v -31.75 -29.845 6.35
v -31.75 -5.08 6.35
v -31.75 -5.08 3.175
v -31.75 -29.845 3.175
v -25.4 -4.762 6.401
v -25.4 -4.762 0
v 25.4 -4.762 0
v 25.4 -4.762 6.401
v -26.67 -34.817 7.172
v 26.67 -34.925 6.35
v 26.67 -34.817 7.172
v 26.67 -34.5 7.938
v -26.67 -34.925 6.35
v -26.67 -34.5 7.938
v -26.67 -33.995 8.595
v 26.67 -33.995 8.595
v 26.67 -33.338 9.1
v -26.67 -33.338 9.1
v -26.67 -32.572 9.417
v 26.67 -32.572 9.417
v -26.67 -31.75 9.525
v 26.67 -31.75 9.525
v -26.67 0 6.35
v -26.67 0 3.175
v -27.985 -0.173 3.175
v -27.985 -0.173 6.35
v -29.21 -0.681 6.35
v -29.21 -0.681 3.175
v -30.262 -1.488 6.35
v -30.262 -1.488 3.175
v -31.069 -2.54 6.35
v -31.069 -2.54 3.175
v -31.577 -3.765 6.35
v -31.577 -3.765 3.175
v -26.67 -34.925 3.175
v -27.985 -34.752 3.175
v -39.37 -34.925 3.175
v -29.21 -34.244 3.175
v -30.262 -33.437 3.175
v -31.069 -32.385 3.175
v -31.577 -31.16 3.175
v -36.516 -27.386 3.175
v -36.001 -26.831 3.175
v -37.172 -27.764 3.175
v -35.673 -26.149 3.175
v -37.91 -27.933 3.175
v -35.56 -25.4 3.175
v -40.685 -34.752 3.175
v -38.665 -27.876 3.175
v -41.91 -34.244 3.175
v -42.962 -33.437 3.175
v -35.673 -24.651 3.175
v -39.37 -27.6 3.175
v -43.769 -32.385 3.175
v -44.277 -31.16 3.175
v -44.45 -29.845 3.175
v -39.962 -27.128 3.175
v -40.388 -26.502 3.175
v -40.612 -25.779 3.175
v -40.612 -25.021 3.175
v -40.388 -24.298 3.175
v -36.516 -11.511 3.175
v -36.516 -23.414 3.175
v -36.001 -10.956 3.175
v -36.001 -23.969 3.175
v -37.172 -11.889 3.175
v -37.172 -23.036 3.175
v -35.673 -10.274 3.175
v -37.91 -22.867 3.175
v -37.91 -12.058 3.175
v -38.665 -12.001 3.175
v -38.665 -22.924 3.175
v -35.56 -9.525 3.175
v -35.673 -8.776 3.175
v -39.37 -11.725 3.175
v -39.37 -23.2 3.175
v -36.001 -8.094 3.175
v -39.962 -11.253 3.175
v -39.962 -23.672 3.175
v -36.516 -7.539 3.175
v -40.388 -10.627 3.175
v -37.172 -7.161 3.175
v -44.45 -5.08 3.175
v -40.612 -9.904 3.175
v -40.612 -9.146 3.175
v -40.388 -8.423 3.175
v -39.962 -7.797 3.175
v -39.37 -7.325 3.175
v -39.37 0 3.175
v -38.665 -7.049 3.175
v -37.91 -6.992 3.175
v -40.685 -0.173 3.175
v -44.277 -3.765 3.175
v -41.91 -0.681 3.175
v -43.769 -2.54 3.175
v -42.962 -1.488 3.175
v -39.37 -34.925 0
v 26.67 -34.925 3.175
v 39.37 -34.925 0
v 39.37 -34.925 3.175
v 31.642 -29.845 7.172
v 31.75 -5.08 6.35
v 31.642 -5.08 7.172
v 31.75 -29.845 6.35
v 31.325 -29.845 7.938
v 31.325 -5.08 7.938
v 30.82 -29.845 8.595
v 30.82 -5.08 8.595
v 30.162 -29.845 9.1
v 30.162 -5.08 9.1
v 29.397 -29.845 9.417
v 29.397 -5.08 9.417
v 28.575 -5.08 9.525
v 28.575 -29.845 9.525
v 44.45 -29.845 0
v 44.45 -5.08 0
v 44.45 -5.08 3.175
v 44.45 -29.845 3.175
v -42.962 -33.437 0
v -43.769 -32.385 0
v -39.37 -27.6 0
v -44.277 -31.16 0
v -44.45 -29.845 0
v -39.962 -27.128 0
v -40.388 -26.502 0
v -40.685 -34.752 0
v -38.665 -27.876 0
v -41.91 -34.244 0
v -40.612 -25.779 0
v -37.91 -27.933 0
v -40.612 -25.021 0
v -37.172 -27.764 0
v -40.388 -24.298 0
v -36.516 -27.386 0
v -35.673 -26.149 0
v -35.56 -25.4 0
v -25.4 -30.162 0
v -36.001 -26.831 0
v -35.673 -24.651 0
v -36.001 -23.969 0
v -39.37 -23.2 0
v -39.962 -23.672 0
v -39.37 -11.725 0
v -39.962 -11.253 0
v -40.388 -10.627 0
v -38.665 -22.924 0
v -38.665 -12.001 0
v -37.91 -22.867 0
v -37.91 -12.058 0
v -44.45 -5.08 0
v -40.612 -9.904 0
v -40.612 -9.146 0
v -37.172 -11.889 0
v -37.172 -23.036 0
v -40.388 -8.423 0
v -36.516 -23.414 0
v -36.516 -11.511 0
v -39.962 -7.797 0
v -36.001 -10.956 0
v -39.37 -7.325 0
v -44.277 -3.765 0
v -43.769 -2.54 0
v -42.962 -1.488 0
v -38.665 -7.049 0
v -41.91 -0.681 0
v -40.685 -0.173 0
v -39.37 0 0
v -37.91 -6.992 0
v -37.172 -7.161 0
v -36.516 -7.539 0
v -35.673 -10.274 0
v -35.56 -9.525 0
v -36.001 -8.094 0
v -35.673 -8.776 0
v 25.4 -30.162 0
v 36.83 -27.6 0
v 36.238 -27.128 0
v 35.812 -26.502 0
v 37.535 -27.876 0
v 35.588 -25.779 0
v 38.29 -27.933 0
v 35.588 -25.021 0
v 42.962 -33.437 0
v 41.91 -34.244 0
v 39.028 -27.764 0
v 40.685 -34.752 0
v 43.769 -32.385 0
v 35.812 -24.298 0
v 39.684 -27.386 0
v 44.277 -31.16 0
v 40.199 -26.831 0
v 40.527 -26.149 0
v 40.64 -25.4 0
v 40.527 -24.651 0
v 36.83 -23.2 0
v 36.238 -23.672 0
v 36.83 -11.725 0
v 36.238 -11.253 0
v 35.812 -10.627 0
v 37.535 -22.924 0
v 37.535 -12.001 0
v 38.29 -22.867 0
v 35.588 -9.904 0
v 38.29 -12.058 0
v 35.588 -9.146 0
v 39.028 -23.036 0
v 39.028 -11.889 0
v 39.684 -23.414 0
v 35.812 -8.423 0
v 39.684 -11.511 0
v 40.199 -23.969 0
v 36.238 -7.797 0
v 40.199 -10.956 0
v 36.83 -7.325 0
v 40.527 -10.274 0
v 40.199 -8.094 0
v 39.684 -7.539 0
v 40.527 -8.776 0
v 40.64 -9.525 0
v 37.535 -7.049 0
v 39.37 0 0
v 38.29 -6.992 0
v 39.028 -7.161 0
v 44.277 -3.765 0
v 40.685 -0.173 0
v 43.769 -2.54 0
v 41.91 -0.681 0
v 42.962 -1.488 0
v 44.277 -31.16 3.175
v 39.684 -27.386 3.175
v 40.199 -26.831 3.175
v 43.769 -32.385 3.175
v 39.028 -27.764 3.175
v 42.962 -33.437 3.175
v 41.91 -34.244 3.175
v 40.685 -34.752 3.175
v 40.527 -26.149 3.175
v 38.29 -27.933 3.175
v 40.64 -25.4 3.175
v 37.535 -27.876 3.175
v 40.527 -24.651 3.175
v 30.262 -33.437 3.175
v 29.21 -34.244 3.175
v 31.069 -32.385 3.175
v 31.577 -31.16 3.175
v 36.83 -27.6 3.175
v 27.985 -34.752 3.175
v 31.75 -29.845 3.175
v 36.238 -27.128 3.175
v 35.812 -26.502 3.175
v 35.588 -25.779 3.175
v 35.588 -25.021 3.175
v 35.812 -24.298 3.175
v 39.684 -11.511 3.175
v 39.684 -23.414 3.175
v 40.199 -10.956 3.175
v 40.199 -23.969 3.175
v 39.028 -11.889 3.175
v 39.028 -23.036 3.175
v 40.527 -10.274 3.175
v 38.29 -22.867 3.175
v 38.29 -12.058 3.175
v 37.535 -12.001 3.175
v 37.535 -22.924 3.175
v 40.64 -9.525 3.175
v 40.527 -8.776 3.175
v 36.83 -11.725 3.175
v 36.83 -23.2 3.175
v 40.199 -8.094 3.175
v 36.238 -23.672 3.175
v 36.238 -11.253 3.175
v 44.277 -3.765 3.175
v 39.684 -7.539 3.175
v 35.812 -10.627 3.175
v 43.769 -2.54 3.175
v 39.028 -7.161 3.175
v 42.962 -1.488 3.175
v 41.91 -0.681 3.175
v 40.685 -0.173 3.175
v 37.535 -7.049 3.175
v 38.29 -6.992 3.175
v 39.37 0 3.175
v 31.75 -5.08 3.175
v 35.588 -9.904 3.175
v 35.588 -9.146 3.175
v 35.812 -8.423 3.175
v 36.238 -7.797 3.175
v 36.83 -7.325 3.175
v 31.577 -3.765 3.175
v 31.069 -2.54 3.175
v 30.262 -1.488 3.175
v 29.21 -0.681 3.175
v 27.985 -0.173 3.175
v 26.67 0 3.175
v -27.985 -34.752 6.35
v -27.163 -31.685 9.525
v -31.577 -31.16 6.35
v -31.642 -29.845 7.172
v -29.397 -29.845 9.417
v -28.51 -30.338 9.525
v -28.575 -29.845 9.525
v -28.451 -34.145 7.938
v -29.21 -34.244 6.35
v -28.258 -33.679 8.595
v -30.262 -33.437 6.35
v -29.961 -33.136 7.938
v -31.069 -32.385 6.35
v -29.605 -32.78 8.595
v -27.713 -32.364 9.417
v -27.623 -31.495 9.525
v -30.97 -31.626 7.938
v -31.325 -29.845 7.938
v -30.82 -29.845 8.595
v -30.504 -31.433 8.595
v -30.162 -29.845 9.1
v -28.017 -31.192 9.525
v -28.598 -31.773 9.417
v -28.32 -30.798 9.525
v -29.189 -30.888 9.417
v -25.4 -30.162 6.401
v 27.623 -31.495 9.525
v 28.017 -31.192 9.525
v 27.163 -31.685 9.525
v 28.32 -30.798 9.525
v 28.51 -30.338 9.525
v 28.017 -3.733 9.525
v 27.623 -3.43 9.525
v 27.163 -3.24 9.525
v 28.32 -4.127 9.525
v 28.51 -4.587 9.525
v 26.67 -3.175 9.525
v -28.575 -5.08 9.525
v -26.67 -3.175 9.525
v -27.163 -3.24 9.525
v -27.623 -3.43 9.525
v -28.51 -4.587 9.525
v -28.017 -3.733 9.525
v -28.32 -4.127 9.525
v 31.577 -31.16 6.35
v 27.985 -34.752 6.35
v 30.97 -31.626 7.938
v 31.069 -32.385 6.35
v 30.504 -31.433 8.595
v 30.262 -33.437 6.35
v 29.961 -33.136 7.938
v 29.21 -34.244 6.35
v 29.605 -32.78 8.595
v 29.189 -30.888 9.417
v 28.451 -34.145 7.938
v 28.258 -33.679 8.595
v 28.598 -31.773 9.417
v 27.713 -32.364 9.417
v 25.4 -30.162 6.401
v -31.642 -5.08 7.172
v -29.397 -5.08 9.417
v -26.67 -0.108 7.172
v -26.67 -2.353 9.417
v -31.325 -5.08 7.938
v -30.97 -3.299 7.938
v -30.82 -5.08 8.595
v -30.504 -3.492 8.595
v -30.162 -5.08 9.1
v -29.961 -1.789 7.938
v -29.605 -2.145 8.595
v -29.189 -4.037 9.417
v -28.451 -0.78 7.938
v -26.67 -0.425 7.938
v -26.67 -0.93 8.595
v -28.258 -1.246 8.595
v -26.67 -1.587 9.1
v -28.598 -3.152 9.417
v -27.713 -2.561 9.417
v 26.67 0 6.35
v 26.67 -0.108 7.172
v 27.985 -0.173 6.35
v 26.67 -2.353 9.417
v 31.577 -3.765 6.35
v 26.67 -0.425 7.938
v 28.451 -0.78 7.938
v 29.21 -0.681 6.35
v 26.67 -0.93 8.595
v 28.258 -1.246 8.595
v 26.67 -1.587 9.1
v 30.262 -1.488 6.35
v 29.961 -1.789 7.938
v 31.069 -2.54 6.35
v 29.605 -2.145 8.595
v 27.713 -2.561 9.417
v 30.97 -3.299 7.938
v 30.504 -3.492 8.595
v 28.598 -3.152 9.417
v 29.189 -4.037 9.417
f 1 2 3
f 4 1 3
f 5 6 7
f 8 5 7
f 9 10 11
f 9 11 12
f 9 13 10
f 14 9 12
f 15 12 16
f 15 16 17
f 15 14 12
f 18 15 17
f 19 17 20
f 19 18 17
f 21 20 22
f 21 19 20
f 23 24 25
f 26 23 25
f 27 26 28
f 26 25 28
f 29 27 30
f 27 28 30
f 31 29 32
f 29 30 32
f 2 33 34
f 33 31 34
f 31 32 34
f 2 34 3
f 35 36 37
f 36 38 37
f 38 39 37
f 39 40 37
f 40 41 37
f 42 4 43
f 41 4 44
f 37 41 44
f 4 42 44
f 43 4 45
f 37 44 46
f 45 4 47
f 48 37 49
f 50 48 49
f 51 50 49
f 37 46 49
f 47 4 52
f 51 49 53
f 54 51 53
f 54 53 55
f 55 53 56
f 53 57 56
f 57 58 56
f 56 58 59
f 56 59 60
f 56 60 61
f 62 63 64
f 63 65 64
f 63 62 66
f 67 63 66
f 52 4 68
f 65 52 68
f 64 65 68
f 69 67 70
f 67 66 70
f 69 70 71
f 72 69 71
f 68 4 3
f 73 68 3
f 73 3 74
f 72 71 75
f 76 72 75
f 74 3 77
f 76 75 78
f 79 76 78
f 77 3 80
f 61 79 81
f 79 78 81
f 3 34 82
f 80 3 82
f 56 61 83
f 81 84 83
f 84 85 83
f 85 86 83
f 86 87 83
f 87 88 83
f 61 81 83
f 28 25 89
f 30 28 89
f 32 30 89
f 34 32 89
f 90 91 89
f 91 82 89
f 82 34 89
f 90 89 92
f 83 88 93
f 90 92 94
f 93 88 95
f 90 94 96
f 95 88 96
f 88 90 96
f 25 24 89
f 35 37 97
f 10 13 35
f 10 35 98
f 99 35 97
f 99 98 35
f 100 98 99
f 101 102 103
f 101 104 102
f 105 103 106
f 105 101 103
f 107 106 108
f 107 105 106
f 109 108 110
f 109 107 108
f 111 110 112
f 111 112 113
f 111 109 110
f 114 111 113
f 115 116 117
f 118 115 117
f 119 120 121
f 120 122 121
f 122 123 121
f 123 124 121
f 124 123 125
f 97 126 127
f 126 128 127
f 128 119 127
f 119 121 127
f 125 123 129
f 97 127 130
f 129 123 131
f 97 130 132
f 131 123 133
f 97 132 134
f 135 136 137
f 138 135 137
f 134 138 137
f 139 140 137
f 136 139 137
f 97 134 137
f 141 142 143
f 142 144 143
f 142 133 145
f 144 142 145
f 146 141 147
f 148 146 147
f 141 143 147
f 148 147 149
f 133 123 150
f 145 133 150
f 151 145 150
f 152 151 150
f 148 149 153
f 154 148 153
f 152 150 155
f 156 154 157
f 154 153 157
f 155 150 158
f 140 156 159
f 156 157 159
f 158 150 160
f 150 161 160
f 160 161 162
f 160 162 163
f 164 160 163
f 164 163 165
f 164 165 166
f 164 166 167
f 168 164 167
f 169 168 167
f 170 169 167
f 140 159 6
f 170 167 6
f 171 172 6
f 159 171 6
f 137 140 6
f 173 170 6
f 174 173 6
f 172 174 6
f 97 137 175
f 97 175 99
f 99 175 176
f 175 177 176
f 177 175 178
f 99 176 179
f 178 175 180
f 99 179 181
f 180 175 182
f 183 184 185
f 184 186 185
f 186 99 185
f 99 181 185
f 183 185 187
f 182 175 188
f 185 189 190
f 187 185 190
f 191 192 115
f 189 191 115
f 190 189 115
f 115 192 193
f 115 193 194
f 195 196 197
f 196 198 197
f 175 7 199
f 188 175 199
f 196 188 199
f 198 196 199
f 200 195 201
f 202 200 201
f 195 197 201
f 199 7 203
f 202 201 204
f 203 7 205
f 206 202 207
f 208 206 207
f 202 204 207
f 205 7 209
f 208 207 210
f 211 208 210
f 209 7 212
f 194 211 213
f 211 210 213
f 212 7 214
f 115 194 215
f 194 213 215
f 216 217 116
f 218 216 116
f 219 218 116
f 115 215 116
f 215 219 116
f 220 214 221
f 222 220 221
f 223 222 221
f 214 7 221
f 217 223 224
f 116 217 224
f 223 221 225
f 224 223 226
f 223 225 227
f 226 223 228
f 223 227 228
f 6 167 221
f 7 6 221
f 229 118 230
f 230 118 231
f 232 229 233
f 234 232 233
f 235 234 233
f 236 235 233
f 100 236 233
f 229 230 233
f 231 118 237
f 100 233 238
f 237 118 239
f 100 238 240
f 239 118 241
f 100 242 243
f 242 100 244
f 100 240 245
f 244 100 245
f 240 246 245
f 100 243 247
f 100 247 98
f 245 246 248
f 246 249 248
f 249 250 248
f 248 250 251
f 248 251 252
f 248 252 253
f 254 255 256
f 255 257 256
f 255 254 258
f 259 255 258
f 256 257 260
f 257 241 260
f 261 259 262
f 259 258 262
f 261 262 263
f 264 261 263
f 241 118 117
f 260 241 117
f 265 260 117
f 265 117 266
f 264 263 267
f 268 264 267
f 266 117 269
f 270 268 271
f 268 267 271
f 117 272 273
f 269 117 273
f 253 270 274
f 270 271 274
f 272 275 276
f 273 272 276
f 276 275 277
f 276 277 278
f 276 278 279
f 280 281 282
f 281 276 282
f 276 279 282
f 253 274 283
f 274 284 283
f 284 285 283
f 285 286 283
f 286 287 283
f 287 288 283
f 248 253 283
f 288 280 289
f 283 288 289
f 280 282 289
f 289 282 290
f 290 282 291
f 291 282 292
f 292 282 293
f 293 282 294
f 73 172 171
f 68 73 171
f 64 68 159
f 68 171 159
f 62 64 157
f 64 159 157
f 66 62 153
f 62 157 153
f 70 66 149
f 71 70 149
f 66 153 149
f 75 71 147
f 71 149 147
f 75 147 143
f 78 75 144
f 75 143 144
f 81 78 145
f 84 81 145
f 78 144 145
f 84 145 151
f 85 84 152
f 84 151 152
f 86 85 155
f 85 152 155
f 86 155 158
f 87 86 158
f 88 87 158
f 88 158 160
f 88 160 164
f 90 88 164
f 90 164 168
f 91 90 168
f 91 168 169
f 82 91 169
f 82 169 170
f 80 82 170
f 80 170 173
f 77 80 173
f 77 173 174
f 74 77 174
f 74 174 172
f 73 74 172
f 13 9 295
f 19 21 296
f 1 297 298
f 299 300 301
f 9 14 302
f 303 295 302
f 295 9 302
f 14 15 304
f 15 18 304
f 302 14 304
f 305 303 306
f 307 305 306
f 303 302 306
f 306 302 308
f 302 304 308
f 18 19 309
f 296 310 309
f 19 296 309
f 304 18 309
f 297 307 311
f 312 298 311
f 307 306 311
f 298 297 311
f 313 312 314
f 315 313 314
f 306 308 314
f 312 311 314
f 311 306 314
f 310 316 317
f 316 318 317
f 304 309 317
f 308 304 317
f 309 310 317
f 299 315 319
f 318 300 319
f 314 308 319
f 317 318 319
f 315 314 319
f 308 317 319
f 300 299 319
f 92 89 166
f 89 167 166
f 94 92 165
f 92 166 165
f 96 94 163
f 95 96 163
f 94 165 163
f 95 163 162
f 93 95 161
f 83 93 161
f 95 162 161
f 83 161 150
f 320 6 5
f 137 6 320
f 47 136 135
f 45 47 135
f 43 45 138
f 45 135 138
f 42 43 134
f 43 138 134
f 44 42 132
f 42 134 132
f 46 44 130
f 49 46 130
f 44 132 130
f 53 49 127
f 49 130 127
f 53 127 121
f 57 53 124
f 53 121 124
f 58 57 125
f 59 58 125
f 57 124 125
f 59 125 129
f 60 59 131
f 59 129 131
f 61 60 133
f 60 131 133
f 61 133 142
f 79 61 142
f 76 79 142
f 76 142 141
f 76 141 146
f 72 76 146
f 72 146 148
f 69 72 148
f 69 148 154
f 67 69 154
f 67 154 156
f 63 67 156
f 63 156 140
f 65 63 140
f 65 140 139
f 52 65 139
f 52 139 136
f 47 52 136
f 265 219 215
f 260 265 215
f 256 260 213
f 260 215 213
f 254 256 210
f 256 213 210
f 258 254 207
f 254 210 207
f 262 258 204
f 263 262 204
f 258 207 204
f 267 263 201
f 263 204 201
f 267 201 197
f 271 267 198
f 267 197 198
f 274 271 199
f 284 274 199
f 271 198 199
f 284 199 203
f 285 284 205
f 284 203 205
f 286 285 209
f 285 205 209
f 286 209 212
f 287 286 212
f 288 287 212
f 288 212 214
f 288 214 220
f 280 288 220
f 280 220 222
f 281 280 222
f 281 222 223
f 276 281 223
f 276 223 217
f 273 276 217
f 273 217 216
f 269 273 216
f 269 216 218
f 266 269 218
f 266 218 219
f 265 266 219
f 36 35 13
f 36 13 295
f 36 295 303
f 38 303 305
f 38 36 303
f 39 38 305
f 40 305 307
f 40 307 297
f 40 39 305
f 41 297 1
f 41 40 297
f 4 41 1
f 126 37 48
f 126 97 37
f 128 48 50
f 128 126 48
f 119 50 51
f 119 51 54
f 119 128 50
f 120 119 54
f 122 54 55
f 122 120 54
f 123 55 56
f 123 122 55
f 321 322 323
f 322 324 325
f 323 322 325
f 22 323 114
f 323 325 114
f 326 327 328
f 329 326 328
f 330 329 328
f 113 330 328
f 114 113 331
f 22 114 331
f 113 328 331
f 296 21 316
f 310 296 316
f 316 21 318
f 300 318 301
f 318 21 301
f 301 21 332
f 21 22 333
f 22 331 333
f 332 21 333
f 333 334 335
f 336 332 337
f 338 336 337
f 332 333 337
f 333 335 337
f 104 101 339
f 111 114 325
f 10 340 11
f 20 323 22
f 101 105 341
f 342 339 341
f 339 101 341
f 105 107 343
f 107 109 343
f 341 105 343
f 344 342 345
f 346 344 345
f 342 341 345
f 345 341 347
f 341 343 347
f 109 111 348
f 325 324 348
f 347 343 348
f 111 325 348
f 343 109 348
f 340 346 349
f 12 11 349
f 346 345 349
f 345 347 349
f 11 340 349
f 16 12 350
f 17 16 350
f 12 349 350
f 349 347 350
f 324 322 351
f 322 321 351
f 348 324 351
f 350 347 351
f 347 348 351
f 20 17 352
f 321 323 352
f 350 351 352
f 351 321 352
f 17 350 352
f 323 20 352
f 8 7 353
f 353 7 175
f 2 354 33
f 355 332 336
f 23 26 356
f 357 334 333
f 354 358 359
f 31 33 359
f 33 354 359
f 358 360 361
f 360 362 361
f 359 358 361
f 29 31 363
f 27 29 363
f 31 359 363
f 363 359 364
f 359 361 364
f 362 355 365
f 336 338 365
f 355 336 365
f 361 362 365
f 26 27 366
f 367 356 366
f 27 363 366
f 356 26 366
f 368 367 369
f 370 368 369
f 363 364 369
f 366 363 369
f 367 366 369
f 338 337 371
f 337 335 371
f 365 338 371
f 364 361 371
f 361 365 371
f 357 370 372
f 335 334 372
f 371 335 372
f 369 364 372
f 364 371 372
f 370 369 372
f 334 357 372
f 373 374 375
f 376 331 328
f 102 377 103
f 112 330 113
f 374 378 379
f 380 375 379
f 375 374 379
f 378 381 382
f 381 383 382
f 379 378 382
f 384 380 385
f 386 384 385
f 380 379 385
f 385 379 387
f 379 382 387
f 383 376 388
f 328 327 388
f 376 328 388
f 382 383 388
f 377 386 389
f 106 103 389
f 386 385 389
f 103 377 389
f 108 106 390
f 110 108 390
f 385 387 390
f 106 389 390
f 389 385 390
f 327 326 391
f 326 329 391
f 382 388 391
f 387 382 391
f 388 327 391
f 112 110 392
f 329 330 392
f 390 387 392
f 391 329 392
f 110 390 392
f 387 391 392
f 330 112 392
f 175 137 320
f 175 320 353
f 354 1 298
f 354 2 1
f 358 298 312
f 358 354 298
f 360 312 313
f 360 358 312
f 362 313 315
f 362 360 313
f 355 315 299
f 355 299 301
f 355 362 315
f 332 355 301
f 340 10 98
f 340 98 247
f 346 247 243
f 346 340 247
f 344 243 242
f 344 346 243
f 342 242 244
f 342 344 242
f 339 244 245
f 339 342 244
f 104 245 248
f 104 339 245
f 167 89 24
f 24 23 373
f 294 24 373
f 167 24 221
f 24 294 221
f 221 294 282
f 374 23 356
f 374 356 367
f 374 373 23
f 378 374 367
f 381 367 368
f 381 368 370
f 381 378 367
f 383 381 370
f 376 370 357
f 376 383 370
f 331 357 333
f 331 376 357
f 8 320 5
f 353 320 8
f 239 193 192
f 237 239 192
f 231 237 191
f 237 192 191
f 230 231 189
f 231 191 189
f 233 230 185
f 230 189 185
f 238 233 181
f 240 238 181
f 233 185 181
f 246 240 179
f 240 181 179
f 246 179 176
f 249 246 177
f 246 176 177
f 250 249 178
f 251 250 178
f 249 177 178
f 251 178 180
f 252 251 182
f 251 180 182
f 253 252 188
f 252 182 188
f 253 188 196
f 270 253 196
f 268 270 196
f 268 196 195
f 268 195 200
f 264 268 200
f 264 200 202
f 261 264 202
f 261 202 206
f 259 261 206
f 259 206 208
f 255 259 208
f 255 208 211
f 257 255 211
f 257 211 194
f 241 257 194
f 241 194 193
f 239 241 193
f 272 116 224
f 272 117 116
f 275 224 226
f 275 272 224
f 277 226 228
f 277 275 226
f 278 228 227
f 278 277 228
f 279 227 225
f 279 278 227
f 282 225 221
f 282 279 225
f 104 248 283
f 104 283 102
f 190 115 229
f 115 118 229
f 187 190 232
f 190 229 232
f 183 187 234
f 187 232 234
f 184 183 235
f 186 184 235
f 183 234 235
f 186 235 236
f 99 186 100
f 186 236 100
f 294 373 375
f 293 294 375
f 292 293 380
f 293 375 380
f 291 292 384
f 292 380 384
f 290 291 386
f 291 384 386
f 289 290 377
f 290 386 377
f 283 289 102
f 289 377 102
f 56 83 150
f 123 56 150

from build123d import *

# Parameters (mm, degrees)
F1_DEPTH = 34.925
F2_R     = 2.54
F3_DEPTH = 25.4
F4_R     = 5.08
F5_R     = 3.175
F6_W     = 50.8
F6_H     = 25.4
F7_DEPTH = 6.4008


with BuildPart() as f1:
    # F0 (on Front) → F1 (new body)
    with BuildSketch(Plane.XZ):
        Polygon((-12.7, 0), (0, 0), (12.7, 0), (44.45, 0), (44.45, 3.175), (31.75, 3.175), (31.75, 9.525), (-31.75, 9.525), (-31.75, 3.175), (-44.45, 3.175), (-44.45, 0), align=None)
    extrude(amount=F1_DEPTH)

    # F2 (on face) → F3 (cut)
    with BuildSketch(Plane(origin=(0, 0, 0), x_dir=(1, 0, 0), z_dir=(0, 0, -1))):
        with Locations((-38.1, 25.4)):
            Circle(F2_R)
        with Locations((-38.1, 9.525)):
            Circle(F2_R)
        with Locations((38.1, 25.4)):
            Circle(F2_R)
        with Locations((38.1, 9.525)):
            Circle(F2_R)
    extrude(amount=-F3_DEPTH, mode=Mode.SUBTRACT)

    # F4
    f4_edges = [f1.edges().sort_by_distance(p)[0] for p in [
        (-44.45, -34.925, 1.5875),
        (44.45, -34.925, 1.5875),
        (44.45, 0, 1.5875),
        (-44.45, 0, 1.5875),
        (31.75, 0, 6.35),
        (-31.75, 0, 6.35),
        (31.75, -34.925, 6.35),
        (-31.75, -34.925, 6.35),
    ]]
    fillet(f4_edges, radius=F4_R)

    # F5
    f5_edges = [f1.edges().sort_by_distance(p)[0] for p in [
        (-30.262102, -33.437102, 9.525),
    ]]
    fillet(f5_edges, radius=F5_R)

    # F6 (on face) → F7 (cut)
    with BuildSketch(Plane(origin=(0, 0, 0), x_dir=(1, 0, 0), z_dir=(0, 0, -1))):
        with Locations((0, 17.4625)):
            Rectangle(F6_W, F6_H)
    extrude(amount=-F7_DEPTH, mode=Mode.SUBTRACT)


solid = f1.part
